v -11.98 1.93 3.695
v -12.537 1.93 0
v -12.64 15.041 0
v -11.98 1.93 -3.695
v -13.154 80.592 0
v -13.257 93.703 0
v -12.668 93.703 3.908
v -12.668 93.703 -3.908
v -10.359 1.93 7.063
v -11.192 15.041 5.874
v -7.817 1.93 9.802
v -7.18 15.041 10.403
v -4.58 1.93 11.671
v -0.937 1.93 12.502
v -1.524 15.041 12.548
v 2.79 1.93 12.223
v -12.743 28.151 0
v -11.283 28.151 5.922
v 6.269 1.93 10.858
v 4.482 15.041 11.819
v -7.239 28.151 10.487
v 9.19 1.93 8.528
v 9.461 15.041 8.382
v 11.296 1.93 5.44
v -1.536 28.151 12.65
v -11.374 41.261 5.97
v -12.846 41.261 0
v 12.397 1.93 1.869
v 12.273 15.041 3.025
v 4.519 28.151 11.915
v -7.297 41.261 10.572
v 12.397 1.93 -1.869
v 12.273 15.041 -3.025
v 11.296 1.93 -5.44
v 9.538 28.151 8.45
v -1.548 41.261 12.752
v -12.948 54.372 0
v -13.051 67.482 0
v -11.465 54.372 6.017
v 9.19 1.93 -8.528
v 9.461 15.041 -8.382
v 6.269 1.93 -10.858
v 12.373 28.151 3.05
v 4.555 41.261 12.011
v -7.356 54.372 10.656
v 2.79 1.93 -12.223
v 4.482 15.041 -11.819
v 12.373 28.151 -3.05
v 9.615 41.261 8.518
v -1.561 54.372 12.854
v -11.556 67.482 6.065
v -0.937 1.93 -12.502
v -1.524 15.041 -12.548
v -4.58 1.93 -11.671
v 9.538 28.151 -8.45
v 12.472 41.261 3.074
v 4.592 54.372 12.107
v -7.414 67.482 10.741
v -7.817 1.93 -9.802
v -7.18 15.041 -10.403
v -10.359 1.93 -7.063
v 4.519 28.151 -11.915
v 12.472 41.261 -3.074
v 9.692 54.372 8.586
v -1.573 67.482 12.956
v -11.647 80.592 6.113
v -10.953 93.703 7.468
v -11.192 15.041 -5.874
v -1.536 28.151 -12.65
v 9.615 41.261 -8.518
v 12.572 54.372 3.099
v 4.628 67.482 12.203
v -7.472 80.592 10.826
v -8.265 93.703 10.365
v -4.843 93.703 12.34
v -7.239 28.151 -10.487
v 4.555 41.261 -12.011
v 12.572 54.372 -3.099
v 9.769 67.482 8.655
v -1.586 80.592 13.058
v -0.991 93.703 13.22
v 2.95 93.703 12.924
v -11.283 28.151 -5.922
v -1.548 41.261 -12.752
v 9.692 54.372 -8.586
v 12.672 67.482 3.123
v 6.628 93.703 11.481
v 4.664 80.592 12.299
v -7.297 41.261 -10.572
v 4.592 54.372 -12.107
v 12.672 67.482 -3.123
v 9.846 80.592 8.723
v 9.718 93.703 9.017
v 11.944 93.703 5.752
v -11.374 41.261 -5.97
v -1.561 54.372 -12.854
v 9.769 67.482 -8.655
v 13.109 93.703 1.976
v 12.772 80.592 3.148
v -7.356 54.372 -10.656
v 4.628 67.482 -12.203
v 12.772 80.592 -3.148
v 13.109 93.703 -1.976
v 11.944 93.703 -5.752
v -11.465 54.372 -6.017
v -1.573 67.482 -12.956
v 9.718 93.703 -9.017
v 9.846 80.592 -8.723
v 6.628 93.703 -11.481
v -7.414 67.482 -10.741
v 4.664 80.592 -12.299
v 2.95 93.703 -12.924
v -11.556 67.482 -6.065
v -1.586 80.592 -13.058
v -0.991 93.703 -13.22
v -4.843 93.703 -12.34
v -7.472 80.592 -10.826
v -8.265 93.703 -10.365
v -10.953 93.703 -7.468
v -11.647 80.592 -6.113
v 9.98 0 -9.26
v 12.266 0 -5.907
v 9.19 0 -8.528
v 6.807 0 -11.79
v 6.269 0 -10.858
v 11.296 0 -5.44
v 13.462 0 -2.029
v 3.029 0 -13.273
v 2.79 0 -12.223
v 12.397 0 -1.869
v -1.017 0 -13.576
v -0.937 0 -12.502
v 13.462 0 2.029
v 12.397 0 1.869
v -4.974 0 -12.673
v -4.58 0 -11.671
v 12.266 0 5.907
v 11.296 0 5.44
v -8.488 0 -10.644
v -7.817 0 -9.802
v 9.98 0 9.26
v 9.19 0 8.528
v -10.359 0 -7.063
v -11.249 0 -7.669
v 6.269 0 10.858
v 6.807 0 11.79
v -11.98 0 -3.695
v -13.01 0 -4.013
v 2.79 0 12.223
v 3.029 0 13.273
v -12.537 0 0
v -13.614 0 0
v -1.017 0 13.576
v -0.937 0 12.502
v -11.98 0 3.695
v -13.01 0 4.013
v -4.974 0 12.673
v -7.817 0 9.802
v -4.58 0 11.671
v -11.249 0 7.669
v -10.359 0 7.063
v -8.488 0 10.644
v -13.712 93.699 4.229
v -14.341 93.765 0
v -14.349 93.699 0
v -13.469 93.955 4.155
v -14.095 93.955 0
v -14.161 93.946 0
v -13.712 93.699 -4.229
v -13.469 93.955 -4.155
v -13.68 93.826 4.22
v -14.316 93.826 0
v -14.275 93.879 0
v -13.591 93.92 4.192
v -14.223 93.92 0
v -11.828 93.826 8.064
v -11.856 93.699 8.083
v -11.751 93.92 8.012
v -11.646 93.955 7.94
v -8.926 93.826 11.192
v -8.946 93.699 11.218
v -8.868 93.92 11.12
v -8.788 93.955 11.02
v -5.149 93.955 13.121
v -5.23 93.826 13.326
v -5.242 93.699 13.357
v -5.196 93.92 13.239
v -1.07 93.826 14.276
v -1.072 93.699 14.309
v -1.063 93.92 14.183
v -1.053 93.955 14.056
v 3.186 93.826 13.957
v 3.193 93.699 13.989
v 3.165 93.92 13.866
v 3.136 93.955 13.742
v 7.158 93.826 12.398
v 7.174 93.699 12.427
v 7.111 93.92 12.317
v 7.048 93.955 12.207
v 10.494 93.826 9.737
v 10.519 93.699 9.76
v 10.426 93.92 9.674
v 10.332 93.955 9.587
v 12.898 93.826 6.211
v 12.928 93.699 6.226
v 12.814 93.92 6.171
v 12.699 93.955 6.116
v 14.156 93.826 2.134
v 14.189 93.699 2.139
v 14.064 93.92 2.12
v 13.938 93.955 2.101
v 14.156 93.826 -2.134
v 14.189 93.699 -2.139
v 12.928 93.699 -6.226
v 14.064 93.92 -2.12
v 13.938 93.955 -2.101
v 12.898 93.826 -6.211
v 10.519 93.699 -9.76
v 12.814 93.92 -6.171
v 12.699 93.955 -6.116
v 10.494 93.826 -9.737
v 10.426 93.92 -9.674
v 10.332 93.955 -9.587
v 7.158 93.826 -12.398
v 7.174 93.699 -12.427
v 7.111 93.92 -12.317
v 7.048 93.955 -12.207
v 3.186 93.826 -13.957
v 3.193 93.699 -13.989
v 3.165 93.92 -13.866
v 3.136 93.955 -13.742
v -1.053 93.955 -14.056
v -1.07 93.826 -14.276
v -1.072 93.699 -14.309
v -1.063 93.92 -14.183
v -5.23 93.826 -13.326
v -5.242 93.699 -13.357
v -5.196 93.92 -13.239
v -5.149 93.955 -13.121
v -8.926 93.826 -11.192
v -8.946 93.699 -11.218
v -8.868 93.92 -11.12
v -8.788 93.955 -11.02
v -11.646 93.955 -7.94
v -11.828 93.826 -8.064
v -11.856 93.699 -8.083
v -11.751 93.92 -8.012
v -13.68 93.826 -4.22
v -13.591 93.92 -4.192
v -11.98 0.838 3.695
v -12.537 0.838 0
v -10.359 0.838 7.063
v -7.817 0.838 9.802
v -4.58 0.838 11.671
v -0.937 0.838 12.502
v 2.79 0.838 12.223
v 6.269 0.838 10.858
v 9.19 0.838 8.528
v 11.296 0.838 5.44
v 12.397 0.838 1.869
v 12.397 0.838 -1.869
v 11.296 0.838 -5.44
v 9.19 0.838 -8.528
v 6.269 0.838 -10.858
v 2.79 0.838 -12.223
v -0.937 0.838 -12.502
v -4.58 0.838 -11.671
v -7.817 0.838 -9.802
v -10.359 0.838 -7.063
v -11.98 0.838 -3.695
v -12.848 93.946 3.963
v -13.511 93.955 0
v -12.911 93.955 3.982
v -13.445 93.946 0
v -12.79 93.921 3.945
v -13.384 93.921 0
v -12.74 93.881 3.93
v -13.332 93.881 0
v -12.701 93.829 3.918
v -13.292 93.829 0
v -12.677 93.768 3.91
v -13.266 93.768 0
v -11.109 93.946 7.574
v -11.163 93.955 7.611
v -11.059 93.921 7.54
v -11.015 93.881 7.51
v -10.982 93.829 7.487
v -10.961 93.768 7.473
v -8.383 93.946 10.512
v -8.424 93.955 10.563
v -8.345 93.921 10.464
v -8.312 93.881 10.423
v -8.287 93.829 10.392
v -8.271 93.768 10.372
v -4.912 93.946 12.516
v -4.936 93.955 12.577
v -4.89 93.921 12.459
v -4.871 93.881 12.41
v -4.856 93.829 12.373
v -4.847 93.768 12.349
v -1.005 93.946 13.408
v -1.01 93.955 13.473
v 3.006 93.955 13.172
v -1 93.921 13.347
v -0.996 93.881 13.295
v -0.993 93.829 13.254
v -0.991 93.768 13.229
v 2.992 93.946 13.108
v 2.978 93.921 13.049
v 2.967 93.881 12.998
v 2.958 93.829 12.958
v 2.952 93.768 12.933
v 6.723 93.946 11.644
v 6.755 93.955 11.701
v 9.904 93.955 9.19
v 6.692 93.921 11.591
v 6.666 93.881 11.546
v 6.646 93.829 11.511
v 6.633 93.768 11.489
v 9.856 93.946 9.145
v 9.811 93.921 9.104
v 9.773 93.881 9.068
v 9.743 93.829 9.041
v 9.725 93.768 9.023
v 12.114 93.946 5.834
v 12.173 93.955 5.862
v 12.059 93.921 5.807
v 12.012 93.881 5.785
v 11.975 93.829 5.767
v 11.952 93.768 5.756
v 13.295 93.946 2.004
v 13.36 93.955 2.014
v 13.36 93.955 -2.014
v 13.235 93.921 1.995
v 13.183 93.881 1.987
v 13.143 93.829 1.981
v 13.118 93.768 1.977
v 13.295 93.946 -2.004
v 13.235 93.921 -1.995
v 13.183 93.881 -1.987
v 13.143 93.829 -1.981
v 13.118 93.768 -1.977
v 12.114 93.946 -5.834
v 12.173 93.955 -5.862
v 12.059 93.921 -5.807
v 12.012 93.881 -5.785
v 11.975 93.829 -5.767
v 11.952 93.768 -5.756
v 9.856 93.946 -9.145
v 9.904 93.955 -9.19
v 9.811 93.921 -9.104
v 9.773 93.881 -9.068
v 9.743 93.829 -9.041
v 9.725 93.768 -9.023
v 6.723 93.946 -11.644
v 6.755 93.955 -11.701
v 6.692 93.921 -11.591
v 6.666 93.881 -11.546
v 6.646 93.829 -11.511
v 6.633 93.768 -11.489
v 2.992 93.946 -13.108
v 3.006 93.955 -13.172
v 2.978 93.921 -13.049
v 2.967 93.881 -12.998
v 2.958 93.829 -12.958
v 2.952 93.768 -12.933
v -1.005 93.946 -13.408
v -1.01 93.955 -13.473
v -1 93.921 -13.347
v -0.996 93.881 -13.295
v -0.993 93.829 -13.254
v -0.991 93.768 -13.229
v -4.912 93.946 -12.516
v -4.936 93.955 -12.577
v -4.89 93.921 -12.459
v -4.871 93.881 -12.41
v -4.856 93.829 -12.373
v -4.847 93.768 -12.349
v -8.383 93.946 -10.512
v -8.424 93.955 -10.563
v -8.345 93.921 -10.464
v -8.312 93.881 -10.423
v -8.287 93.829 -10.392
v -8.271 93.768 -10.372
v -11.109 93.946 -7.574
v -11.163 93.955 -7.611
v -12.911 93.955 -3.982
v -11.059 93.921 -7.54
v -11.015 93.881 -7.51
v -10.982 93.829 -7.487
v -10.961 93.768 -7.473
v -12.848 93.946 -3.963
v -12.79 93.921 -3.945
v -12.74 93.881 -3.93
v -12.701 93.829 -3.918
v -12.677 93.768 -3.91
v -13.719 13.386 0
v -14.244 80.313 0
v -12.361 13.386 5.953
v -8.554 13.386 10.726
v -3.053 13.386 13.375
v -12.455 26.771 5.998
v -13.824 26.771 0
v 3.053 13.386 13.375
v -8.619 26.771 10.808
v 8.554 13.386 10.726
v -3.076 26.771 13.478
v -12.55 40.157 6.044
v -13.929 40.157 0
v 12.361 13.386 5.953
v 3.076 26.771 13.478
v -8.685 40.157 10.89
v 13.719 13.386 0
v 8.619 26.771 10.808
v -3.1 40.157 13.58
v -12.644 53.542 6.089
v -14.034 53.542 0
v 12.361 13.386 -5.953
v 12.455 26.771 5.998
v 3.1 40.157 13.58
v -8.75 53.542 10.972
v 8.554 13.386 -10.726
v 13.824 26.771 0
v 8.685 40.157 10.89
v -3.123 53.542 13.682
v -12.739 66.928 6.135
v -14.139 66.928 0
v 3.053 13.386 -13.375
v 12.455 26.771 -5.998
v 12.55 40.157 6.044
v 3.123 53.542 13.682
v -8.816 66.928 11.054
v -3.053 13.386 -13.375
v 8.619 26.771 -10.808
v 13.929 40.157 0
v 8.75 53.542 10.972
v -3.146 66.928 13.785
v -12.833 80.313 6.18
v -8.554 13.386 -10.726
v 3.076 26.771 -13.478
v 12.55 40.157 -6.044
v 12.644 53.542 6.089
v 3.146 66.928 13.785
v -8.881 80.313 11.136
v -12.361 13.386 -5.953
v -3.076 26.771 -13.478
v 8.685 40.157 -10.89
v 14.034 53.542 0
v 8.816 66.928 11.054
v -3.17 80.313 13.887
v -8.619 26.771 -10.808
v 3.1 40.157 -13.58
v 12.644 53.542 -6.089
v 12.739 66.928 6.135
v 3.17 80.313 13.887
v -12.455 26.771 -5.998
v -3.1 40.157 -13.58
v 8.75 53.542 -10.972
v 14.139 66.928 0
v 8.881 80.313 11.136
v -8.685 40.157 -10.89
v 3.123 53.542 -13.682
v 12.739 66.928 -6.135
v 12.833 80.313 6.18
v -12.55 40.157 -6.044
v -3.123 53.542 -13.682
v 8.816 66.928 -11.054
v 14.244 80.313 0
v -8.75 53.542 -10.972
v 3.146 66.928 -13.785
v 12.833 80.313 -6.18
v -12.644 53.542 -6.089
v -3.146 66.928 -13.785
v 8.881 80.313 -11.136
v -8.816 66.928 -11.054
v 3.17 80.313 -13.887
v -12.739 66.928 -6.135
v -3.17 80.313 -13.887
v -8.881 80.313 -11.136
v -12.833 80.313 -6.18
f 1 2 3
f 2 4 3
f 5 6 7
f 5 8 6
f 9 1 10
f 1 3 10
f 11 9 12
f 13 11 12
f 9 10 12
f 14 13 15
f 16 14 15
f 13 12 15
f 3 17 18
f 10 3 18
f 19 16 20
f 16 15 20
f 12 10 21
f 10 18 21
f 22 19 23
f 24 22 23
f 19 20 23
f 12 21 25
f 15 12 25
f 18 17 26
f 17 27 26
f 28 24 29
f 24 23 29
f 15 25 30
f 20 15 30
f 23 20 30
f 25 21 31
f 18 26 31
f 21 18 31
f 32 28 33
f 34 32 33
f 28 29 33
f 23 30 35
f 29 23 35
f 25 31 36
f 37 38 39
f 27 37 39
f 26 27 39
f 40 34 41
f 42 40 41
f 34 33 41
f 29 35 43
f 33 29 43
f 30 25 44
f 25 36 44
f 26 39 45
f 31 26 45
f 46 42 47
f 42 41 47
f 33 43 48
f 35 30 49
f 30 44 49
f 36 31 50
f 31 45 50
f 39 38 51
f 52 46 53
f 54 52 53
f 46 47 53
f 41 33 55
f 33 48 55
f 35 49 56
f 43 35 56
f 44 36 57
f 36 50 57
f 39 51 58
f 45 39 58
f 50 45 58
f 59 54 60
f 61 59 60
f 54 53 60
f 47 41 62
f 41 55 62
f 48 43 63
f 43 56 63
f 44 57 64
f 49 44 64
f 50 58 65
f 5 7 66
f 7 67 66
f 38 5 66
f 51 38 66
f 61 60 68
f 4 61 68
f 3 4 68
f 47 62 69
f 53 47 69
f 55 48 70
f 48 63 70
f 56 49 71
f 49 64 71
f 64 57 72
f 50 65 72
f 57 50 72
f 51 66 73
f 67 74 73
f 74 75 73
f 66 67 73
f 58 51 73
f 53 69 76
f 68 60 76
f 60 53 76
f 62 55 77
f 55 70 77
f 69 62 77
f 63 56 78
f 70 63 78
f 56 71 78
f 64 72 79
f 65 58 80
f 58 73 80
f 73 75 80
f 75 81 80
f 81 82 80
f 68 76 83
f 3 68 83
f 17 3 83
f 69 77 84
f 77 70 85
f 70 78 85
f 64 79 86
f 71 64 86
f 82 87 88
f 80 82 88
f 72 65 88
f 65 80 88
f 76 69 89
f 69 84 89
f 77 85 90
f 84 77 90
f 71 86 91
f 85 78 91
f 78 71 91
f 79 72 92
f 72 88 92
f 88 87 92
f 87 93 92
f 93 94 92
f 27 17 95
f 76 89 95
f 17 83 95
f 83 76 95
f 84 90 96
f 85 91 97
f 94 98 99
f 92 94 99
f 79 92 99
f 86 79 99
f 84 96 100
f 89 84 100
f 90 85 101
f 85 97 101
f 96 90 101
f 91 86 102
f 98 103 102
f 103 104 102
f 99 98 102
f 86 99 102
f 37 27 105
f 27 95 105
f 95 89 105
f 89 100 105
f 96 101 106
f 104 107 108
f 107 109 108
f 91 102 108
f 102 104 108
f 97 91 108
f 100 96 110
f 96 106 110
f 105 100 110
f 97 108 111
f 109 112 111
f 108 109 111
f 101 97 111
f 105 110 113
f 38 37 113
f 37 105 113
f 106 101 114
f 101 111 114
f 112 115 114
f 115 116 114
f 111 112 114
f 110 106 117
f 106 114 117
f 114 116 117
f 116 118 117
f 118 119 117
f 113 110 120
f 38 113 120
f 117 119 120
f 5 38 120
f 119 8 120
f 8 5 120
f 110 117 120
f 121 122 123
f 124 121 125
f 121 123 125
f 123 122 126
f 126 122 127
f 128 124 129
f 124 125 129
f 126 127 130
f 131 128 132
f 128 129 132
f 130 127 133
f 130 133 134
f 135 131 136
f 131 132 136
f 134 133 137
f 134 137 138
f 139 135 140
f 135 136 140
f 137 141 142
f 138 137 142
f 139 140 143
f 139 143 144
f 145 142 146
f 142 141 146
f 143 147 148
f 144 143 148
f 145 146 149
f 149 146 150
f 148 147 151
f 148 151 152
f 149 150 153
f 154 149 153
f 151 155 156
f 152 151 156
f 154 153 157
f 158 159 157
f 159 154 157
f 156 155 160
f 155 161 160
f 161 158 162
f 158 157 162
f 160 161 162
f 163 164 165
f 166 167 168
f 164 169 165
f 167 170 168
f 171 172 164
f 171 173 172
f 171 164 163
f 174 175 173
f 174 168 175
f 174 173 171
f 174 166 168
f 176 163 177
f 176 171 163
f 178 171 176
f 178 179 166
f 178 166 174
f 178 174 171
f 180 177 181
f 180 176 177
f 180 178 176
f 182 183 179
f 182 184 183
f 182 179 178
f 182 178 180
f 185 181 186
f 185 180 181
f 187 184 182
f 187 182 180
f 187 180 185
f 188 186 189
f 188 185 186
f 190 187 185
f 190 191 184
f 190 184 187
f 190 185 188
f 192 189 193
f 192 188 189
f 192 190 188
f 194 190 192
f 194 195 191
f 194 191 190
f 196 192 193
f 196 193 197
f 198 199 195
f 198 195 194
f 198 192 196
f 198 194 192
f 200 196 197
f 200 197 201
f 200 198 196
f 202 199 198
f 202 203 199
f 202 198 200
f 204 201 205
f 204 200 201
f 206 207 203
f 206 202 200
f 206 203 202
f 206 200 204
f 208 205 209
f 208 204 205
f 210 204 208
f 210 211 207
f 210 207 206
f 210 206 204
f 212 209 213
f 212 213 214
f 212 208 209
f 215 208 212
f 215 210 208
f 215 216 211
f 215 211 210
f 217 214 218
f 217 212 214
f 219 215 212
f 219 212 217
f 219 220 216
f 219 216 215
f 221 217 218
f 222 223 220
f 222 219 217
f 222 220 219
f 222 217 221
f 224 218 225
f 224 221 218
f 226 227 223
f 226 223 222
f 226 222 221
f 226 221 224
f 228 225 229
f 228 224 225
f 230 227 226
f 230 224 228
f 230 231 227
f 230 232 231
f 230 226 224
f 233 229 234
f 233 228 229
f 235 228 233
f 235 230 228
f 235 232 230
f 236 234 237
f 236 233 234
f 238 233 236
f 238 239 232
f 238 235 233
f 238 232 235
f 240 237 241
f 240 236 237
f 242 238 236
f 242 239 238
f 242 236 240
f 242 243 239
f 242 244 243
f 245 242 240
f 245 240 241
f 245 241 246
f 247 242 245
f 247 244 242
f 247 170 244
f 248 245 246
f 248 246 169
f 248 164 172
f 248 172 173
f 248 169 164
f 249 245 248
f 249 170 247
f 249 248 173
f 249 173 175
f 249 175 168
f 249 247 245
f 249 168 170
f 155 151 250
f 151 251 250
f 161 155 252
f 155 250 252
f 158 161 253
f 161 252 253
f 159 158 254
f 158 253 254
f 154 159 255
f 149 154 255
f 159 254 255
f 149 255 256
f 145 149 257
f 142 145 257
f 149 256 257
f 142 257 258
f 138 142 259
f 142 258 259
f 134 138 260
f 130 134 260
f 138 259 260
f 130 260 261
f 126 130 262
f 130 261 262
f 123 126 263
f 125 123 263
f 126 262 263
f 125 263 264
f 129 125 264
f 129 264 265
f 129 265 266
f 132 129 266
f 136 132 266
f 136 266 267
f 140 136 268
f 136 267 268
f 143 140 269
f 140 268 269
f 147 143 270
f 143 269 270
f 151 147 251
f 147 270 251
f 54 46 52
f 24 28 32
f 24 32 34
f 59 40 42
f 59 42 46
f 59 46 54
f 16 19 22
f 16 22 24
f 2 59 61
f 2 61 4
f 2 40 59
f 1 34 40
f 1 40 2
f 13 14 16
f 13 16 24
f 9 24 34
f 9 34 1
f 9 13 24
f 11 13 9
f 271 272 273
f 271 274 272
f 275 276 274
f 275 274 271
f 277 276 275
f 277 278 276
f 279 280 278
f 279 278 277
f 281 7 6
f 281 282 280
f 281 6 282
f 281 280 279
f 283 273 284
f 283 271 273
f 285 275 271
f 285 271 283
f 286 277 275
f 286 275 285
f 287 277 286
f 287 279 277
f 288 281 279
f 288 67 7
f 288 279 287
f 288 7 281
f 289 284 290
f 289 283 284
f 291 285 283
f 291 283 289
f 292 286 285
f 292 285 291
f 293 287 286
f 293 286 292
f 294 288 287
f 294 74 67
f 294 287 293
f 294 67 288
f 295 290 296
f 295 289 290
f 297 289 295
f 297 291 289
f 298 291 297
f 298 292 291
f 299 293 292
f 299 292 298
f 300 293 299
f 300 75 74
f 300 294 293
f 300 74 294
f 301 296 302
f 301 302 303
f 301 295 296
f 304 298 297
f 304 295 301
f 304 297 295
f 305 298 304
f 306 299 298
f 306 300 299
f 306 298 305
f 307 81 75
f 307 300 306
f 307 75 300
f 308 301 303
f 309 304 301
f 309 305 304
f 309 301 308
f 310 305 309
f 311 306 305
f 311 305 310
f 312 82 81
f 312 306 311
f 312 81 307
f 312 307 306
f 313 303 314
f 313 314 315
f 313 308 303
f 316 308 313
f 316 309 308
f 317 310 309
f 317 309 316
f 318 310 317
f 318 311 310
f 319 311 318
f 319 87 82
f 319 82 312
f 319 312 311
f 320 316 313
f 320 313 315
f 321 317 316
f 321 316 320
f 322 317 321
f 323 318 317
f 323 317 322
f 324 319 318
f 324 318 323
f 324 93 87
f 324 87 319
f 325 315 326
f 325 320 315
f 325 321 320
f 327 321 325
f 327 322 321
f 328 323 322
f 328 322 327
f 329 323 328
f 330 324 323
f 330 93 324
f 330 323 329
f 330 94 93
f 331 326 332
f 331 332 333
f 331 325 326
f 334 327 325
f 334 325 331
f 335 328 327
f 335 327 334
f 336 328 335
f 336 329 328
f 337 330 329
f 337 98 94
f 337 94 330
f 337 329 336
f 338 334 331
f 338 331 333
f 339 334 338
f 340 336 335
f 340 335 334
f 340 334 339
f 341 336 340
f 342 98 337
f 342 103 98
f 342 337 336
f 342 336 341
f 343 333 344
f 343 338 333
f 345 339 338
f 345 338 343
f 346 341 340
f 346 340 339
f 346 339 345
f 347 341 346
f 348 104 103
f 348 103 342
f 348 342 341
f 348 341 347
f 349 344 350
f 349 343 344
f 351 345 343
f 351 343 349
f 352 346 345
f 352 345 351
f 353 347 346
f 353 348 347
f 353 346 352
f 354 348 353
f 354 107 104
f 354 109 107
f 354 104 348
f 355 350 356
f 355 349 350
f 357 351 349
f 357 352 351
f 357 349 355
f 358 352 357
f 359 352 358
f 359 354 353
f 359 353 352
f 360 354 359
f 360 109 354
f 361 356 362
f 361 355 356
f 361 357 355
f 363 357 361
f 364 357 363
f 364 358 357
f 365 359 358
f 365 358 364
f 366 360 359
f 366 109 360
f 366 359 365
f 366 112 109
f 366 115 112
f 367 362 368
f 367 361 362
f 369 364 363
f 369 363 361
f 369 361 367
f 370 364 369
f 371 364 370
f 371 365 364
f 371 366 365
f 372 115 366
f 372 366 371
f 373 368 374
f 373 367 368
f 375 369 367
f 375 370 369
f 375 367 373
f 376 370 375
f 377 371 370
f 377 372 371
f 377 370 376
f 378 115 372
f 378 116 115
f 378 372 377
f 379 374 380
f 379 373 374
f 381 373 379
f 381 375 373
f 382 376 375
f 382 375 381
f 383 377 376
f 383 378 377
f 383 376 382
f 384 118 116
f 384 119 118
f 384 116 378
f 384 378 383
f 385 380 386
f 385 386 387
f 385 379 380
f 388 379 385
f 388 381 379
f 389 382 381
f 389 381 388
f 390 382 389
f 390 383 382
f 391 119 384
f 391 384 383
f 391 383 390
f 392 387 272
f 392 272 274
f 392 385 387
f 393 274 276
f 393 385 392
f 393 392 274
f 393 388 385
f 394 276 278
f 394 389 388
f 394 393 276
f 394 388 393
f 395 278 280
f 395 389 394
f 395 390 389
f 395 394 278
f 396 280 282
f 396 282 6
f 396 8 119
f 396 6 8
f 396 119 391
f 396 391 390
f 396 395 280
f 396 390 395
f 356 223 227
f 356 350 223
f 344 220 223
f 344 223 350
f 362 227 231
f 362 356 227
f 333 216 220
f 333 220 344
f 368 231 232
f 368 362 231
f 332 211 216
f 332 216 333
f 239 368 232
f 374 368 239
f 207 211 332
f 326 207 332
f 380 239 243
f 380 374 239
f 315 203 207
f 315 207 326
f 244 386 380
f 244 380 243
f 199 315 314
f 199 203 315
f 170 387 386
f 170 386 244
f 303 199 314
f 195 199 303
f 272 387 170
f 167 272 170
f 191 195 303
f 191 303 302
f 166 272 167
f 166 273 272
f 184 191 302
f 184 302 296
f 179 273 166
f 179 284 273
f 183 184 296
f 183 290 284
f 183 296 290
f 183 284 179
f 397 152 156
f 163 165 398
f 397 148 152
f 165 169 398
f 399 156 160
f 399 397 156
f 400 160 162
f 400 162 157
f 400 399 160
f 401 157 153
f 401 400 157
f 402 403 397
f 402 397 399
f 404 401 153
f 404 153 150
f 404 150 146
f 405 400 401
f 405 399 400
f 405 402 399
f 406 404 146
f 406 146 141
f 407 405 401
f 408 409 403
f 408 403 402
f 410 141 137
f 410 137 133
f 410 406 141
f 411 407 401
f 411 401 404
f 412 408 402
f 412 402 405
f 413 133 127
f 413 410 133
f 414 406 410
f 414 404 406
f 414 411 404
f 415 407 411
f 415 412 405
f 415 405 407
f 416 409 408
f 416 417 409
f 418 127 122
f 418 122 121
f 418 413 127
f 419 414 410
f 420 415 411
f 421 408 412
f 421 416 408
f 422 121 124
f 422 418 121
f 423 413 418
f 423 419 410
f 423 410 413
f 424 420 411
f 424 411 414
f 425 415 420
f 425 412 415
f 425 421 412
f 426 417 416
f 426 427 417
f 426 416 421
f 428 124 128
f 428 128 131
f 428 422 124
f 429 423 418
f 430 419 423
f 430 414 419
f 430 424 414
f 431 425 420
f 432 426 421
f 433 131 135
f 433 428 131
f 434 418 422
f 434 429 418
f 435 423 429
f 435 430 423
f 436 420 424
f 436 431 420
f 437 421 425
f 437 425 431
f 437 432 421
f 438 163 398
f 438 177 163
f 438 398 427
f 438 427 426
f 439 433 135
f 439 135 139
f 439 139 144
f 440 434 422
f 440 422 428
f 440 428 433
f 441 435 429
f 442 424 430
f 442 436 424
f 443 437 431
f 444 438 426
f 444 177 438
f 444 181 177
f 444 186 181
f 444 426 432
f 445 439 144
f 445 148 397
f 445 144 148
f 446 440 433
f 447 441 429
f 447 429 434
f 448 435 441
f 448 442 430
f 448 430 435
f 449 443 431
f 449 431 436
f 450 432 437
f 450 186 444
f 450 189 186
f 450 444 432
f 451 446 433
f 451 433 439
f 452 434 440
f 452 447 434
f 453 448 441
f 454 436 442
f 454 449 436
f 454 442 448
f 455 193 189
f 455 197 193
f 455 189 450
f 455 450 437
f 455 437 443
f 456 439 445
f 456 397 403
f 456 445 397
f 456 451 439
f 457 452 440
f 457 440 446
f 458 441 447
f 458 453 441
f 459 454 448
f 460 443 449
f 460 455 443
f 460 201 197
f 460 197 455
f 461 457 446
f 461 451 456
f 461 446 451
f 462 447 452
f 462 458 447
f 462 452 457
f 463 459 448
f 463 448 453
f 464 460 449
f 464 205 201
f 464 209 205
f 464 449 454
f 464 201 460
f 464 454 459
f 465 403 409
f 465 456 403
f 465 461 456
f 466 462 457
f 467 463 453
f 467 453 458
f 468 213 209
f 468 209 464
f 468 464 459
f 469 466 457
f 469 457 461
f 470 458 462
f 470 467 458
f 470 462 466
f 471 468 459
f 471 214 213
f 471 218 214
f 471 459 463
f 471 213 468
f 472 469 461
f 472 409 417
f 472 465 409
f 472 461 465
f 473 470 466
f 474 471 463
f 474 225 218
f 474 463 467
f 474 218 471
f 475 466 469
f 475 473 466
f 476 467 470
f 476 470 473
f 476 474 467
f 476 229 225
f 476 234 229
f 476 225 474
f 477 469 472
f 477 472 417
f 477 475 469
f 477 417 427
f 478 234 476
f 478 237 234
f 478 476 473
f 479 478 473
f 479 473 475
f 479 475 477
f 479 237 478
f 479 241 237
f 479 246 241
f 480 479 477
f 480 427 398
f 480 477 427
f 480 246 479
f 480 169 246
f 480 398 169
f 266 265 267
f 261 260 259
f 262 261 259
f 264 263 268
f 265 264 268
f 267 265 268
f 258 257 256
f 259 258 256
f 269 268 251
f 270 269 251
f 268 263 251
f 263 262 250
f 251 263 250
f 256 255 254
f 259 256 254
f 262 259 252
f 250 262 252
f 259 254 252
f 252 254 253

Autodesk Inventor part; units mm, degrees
ref_plane "YZ Plane" through (0, 0, 0) normal (1, 0, 0) x (0, 1, 0)
ref_plane "XZ Plane" through (0, 0, 0) normal (0, 1, 0) x (-1, 0, 0)
ref_plane "XY Plane" through (0, 0, 0) normal (0, 0, 1) x (1, 0, 0)
sketch "Sketch1" plane through (0, 0, 0) normal (0, 0, 1) x (1, 0, 0)
  line L0 (0, 116.9344) -> (0, -19.4891) projected
  line L1 (-17.2212, 0) -> (2.8702, 0) projected
  line L2 (0, 0) -> (0, 97.4453)
  line L3 (0, 0) -> (-13.6144, 0)
  line L4 (-13.6144, 0) -> (-14.351, 93.9546)
  line L5 (-14.351, 93.9546) -> (-13.2588, 93.9546)
  line L6 (-13.2588, 93.9546) -> (-12.5373, 1.9304)
  line L7 (-12.5373, 0) -> (-12.5373, 0.8382)
  line L8 (-12.5373, 0.8382) -> (0, 0.8382)
  line L9 (-12.5373, 1.9304) -> (0, 1.9304)
  line L10 (0, 1.9304) -> (0, 0.8382)
  dimension "d0" = 27.2288
  dimension "d1" = 28.702
  dimension "d2" = 93.9546
  dimension "d3" = 1.0922
  dimension "d5" = 0.8382
  dimension "d6" = 1.0922
  dimension "d9" = 26.5175
revolve "Revolution1" add sketch "Sketch1" angle 360 about axis through (0, 0, 0) along (0, 1, 0) contours L0 L8 L7 L1 L4 L5 L6 L9
fillet "Fillet1" radius 0.254 2 edges at (13.2588, 93.9546, 0) (14.351, 93.9546, 0)
